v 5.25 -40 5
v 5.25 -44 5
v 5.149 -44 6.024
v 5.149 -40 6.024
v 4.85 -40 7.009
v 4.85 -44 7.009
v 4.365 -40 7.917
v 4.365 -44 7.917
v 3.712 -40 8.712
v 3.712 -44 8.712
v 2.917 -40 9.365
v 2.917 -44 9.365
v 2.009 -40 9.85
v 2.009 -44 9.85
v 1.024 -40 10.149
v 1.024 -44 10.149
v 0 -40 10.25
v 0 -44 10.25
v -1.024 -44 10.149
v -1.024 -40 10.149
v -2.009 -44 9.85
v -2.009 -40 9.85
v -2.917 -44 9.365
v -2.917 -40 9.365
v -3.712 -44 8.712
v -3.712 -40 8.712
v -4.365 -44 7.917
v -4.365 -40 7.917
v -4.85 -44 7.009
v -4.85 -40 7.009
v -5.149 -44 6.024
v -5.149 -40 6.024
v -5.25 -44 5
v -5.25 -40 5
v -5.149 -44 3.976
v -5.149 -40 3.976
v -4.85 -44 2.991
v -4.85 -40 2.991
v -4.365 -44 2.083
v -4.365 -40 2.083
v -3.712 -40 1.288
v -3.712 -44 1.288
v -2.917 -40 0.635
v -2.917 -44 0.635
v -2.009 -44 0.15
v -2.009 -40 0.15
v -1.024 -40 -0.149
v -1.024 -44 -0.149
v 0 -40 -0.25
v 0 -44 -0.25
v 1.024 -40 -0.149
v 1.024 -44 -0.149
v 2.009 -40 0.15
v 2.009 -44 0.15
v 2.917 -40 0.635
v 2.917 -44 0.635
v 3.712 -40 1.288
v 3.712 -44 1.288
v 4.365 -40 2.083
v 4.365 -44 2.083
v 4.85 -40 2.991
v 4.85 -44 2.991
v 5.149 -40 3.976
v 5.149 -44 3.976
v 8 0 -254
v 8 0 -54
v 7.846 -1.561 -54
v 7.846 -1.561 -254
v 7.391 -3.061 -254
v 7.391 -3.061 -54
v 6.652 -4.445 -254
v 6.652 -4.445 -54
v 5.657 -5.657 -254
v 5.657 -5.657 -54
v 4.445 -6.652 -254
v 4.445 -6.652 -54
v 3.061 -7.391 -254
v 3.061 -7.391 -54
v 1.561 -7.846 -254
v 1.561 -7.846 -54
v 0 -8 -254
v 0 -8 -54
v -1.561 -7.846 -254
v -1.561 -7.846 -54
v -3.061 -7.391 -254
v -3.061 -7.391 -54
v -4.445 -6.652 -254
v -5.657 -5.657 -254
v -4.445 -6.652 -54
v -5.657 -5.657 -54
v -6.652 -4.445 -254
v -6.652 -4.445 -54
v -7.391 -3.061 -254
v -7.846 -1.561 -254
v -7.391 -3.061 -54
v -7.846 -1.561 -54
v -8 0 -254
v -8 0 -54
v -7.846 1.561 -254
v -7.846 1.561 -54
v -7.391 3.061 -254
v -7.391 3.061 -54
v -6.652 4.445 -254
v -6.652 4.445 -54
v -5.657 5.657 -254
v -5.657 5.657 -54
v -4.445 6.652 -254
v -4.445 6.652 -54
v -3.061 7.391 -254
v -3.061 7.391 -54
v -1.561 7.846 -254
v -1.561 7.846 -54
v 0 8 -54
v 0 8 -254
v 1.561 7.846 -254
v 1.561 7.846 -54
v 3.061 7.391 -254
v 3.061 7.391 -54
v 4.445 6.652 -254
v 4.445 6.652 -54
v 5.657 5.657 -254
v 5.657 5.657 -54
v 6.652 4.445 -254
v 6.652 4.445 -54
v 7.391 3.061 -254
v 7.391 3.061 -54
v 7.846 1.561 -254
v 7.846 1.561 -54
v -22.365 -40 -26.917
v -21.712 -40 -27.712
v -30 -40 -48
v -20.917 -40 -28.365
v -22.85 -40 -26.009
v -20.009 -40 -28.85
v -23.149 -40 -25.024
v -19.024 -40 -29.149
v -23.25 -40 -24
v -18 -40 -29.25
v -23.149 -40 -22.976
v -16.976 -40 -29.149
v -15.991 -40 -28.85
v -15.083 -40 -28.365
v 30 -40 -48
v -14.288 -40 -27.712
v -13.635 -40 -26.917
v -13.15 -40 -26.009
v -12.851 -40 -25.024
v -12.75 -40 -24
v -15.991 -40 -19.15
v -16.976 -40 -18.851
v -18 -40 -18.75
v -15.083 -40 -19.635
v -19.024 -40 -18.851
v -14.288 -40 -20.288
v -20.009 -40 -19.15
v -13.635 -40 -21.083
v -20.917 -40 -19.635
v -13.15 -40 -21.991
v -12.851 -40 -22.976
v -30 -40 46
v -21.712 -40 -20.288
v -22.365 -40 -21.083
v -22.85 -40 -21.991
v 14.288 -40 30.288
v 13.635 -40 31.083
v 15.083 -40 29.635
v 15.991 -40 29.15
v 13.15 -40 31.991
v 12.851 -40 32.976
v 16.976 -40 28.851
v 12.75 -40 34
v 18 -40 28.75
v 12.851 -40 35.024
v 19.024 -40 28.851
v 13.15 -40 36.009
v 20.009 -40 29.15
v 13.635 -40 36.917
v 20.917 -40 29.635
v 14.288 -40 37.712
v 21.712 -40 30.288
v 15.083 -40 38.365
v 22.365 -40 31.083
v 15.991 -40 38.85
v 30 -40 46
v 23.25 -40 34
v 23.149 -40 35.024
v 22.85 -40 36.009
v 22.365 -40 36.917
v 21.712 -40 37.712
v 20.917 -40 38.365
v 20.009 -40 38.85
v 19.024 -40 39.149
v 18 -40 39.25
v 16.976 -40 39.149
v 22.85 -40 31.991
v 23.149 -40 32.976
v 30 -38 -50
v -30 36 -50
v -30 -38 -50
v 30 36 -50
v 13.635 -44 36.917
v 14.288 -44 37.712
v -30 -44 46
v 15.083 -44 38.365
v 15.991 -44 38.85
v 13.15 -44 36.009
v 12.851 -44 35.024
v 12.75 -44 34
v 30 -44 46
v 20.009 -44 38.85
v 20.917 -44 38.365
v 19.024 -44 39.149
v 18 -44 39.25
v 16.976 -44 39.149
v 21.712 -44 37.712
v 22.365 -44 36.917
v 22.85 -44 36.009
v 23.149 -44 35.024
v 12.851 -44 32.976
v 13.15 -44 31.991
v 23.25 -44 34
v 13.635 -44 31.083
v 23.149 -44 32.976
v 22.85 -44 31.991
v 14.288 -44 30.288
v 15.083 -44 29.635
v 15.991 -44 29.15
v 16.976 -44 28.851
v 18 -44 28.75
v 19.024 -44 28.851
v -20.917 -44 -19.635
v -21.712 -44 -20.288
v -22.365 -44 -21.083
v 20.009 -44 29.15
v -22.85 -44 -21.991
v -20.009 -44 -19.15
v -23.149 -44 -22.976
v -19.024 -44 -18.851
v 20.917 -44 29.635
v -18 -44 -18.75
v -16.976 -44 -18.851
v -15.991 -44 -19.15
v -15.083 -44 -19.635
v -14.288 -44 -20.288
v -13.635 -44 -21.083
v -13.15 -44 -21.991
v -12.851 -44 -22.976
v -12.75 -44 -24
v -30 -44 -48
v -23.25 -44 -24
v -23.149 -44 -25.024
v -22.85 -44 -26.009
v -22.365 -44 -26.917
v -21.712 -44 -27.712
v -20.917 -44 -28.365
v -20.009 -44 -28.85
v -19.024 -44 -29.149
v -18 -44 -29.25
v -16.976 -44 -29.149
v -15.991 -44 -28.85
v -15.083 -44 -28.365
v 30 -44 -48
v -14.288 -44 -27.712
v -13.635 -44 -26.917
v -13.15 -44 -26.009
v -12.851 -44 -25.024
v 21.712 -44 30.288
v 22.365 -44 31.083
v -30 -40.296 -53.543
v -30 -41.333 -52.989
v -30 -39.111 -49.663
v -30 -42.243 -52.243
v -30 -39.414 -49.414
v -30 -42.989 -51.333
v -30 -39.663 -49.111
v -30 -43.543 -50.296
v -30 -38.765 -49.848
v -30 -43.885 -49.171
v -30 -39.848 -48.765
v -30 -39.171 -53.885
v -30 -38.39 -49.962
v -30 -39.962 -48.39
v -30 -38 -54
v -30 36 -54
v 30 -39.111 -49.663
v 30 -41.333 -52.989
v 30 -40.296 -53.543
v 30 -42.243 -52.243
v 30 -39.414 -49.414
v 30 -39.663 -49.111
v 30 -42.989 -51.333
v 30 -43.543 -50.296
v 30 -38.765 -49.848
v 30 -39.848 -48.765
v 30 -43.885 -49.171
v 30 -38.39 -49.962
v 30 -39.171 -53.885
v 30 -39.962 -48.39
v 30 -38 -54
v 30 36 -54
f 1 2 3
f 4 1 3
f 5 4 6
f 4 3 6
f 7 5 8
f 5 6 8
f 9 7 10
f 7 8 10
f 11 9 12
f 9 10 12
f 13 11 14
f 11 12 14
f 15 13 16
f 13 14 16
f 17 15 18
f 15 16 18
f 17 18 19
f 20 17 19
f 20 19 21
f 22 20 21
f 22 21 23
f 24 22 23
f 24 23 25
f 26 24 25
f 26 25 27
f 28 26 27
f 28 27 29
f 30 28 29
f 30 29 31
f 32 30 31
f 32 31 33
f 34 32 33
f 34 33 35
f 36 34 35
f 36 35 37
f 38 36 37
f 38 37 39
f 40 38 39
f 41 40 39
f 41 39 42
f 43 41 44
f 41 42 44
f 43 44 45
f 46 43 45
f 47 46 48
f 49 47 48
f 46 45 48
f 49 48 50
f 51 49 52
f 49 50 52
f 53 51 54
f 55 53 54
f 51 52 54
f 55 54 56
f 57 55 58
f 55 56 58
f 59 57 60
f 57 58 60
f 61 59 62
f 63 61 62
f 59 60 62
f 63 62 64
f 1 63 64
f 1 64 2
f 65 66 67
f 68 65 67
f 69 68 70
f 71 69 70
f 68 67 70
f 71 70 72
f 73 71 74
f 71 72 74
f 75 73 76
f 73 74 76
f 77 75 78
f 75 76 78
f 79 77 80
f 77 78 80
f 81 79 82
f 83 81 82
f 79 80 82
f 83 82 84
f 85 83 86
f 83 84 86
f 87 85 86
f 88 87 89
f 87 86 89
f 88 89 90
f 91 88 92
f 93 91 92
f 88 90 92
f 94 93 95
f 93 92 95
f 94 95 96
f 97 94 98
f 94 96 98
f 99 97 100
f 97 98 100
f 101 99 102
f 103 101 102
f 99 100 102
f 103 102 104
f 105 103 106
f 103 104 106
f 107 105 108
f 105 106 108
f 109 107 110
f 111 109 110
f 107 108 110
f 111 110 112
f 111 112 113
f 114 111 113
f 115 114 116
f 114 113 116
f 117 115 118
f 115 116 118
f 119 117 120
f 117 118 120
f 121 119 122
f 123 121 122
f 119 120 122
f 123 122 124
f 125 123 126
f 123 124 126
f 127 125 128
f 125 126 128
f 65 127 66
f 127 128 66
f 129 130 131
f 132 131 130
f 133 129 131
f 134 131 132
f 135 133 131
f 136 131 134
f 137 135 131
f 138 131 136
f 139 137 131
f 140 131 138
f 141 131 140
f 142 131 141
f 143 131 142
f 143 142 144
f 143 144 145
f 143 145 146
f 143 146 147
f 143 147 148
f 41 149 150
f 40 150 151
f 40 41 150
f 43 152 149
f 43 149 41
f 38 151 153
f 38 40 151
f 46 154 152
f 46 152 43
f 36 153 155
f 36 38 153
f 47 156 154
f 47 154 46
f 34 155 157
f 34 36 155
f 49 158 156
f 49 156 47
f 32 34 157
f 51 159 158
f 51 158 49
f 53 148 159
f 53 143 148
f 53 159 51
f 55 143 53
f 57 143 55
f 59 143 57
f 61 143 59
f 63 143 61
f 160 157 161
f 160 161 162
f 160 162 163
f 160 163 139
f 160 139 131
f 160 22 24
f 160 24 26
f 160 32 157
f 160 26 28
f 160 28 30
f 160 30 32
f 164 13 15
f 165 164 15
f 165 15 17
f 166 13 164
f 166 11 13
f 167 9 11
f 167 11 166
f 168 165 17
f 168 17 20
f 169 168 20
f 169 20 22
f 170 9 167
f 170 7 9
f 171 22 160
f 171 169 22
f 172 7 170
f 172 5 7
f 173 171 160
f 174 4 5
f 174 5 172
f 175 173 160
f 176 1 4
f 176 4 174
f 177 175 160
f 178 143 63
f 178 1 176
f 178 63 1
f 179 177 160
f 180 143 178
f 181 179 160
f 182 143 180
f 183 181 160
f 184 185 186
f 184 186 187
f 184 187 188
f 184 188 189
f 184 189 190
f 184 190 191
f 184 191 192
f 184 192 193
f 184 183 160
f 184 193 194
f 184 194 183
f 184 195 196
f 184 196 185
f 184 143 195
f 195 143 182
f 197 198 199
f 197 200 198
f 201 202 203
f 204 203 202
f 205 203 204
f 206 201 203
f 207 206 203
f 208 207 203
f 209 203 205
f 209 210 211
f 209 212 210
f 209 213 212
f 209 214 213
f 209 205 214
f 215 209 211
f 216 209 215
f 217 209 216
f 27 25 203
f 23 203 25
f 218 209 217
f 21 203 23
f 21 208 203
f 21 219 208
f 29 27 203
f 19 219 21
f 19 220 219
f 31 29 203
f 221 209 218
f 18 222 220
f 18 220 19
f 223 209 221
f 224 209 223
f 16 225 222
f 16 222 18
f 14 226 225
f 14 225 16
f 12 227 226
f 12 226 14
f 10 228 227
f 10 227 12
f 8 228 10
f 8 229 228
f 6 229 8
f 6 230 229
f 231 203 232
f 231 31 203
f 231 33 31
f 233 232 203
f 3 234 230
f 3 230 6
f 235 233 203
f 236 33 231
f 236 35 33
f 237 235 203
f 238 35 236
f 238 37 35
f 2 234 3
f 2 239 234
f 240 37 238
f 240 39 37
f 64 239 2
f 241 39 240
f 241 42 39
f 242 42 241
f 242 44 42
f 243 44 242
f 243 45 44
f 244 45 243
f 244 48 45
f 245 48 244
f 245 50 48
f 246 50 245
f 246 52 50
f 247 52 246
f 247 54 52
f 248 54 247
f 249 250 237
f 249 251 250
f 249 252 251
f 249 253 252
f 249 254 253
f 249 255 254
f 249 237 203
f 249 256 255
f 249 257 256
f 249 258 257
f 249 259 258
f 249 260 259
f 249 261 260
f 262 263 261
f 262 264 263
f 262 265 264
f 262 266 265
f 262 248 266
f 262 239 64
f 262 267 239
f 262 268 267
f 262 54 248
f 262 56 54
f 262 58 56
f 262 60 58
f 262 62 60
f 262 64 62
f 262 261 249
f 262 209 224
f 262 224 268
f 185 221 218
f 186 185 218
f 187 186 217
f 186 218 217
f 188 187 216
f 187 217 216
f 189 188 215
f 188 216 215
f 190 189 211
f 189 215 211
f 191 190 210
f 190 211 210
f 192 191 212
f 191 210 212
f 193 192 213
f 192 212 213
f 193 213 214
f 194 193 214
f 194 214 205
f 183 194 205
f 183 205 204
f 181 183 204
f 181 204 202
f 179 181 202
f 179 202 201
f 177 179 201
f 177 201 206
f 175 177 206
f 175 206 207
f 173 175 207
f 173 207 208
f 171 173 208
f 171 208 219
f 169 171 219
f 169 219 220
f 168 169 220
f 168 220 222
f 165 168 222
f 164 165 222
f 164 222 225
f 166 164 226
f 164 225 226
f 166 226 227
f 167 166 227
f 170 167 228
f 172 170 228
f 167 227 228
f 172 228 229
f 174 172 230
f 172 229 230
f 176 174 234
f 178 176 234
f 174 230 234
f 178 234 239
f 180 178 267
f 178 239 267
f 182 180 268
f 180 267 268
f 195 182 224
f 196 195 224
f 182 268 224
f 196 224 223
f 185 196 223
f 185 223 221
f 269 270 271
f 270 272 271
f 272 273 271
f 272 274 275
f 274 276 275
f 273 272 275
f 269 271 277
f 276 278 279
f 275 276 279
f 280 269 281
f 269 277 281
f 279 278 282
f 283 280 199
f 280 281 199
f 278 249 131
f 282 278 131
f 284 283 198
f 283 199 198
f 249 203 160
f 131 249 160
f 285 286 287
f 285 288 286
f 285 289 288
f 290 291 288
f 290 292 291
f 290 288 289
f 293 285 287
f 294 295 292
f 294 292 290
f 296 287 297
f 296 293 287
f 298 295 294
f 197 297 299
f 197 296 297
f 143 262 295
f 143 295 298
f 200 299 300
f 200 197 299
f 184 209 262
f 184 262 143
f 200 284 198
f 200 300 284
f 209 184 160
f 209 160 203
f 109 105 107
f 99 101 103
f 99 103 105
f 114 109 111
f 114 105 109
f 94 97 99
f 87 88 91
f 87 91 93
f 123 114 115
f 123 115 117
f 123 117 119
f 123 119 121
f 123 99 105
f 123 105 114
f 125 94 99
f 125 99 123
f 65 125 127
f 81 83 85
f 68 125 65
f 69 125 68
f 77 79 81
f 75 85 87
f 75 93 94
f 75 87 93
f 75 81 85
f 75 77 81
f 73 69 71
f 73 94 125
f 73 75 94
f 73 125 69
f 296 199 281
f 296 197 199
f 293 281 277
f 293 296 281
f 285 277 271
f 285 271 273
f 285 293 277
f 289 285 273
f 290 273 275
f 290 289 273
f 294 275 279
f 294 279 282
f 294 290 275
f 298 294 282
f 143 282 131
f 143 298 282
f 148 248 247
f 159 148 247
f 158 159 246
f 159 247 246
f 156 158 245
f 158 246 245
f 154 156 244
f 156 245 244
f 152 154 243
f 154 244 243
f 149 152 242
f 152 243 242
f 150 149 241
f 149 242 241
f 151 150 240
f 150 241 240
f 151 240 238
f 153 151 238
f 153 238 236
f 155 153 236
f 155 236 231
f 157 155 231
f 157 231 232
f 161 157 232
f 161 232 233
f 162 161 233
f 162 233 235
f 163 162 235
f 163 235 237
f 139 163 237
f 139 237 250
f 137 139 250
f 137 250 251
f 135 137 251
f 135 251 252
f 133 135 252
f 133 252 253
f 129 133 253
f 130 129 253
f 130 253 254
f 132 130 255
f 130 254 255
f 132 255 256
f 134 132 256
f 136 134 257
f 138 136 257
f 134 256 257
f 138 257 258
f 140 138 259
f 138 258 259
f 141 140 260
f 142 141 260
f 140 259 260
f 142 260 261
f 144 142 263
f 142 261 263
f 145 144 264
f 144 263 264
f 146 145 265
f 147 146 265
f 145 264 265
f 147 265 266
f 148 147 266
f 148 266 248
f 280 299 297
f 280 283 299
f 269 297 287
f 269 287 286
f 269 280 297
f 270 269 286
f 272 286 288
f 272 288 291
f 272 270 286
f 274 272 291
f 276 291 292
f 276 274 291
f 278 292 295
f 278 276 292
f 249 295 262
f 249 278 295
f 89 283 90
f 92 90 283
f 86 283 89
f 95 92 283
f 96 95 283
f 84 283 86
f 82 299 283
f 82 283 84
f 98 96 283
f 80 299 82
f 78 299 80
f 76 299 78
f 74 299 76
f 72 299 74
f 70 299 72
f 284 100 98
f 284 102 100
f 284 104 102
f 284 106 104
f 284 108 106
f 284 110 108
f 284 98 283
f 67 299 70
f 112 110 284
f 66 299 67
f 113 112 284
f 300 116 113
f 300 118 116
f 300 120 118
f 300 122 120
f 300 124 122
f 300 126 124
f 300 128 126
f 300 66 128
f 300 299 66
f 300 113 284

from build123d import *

# Parameters (mm, degrees)
F1_DEPTH = 30
F2_R     = 8
F3_DEPTH = 200
F5_R     = 2
F6_R     = 6
F4_R     = 5.25
F7_DEPTH = 25


# Not quite as in the source:
# - a feature names something its author has since deleted; it is built from what else it names


with BuildPart() as f1:
    # F0 (on Right) → F1 (new body, symmetric)
    with BuildSketch(Plane.YZ):
        Polygon((36, -50), (-40, -50), (-40, 46), (-44, 46), (-44, -54), (36, -54), align=None)
    extrude(amount=F1_DEPTH, both=True)

    # F2 (on face) → F3 (join)
    with BuildSketch(Plane(origin=(0, 0, -54), x_dir=(1, 0, 0), z_dir=(0, 0, -1))):
        Circle(F2_R)
    extrude(amount=F3_DEPTH)

    # F5
    f5_edges = [f1.edges().sort_by_distance(p)[0] for p in [
        (0, -40, -50),
    ]]
    fillet(f5_edges, radius=F5_R)

    # F6
    f6_edges = [f1.edges().sort_by_distance(p)[0] for p in [
        (0, -44, -54),
    ]]
    fillet(f6_edges, radius=F6_R)

    # F4 (on face) → F7 (cut)
    with BuildSketch(Plane.XZ.offset(44)):
        with Locations((18, 34)):
            Circle(F4_R)
        with Locations((0, 5)):
            Circle(F4_R)
        with Locations((-18, -24)):
            Circle(F4_R)
    extrude(amount=-F7_DEPTH, mode=Mode.SUBTRACT)


solid = f1.part
